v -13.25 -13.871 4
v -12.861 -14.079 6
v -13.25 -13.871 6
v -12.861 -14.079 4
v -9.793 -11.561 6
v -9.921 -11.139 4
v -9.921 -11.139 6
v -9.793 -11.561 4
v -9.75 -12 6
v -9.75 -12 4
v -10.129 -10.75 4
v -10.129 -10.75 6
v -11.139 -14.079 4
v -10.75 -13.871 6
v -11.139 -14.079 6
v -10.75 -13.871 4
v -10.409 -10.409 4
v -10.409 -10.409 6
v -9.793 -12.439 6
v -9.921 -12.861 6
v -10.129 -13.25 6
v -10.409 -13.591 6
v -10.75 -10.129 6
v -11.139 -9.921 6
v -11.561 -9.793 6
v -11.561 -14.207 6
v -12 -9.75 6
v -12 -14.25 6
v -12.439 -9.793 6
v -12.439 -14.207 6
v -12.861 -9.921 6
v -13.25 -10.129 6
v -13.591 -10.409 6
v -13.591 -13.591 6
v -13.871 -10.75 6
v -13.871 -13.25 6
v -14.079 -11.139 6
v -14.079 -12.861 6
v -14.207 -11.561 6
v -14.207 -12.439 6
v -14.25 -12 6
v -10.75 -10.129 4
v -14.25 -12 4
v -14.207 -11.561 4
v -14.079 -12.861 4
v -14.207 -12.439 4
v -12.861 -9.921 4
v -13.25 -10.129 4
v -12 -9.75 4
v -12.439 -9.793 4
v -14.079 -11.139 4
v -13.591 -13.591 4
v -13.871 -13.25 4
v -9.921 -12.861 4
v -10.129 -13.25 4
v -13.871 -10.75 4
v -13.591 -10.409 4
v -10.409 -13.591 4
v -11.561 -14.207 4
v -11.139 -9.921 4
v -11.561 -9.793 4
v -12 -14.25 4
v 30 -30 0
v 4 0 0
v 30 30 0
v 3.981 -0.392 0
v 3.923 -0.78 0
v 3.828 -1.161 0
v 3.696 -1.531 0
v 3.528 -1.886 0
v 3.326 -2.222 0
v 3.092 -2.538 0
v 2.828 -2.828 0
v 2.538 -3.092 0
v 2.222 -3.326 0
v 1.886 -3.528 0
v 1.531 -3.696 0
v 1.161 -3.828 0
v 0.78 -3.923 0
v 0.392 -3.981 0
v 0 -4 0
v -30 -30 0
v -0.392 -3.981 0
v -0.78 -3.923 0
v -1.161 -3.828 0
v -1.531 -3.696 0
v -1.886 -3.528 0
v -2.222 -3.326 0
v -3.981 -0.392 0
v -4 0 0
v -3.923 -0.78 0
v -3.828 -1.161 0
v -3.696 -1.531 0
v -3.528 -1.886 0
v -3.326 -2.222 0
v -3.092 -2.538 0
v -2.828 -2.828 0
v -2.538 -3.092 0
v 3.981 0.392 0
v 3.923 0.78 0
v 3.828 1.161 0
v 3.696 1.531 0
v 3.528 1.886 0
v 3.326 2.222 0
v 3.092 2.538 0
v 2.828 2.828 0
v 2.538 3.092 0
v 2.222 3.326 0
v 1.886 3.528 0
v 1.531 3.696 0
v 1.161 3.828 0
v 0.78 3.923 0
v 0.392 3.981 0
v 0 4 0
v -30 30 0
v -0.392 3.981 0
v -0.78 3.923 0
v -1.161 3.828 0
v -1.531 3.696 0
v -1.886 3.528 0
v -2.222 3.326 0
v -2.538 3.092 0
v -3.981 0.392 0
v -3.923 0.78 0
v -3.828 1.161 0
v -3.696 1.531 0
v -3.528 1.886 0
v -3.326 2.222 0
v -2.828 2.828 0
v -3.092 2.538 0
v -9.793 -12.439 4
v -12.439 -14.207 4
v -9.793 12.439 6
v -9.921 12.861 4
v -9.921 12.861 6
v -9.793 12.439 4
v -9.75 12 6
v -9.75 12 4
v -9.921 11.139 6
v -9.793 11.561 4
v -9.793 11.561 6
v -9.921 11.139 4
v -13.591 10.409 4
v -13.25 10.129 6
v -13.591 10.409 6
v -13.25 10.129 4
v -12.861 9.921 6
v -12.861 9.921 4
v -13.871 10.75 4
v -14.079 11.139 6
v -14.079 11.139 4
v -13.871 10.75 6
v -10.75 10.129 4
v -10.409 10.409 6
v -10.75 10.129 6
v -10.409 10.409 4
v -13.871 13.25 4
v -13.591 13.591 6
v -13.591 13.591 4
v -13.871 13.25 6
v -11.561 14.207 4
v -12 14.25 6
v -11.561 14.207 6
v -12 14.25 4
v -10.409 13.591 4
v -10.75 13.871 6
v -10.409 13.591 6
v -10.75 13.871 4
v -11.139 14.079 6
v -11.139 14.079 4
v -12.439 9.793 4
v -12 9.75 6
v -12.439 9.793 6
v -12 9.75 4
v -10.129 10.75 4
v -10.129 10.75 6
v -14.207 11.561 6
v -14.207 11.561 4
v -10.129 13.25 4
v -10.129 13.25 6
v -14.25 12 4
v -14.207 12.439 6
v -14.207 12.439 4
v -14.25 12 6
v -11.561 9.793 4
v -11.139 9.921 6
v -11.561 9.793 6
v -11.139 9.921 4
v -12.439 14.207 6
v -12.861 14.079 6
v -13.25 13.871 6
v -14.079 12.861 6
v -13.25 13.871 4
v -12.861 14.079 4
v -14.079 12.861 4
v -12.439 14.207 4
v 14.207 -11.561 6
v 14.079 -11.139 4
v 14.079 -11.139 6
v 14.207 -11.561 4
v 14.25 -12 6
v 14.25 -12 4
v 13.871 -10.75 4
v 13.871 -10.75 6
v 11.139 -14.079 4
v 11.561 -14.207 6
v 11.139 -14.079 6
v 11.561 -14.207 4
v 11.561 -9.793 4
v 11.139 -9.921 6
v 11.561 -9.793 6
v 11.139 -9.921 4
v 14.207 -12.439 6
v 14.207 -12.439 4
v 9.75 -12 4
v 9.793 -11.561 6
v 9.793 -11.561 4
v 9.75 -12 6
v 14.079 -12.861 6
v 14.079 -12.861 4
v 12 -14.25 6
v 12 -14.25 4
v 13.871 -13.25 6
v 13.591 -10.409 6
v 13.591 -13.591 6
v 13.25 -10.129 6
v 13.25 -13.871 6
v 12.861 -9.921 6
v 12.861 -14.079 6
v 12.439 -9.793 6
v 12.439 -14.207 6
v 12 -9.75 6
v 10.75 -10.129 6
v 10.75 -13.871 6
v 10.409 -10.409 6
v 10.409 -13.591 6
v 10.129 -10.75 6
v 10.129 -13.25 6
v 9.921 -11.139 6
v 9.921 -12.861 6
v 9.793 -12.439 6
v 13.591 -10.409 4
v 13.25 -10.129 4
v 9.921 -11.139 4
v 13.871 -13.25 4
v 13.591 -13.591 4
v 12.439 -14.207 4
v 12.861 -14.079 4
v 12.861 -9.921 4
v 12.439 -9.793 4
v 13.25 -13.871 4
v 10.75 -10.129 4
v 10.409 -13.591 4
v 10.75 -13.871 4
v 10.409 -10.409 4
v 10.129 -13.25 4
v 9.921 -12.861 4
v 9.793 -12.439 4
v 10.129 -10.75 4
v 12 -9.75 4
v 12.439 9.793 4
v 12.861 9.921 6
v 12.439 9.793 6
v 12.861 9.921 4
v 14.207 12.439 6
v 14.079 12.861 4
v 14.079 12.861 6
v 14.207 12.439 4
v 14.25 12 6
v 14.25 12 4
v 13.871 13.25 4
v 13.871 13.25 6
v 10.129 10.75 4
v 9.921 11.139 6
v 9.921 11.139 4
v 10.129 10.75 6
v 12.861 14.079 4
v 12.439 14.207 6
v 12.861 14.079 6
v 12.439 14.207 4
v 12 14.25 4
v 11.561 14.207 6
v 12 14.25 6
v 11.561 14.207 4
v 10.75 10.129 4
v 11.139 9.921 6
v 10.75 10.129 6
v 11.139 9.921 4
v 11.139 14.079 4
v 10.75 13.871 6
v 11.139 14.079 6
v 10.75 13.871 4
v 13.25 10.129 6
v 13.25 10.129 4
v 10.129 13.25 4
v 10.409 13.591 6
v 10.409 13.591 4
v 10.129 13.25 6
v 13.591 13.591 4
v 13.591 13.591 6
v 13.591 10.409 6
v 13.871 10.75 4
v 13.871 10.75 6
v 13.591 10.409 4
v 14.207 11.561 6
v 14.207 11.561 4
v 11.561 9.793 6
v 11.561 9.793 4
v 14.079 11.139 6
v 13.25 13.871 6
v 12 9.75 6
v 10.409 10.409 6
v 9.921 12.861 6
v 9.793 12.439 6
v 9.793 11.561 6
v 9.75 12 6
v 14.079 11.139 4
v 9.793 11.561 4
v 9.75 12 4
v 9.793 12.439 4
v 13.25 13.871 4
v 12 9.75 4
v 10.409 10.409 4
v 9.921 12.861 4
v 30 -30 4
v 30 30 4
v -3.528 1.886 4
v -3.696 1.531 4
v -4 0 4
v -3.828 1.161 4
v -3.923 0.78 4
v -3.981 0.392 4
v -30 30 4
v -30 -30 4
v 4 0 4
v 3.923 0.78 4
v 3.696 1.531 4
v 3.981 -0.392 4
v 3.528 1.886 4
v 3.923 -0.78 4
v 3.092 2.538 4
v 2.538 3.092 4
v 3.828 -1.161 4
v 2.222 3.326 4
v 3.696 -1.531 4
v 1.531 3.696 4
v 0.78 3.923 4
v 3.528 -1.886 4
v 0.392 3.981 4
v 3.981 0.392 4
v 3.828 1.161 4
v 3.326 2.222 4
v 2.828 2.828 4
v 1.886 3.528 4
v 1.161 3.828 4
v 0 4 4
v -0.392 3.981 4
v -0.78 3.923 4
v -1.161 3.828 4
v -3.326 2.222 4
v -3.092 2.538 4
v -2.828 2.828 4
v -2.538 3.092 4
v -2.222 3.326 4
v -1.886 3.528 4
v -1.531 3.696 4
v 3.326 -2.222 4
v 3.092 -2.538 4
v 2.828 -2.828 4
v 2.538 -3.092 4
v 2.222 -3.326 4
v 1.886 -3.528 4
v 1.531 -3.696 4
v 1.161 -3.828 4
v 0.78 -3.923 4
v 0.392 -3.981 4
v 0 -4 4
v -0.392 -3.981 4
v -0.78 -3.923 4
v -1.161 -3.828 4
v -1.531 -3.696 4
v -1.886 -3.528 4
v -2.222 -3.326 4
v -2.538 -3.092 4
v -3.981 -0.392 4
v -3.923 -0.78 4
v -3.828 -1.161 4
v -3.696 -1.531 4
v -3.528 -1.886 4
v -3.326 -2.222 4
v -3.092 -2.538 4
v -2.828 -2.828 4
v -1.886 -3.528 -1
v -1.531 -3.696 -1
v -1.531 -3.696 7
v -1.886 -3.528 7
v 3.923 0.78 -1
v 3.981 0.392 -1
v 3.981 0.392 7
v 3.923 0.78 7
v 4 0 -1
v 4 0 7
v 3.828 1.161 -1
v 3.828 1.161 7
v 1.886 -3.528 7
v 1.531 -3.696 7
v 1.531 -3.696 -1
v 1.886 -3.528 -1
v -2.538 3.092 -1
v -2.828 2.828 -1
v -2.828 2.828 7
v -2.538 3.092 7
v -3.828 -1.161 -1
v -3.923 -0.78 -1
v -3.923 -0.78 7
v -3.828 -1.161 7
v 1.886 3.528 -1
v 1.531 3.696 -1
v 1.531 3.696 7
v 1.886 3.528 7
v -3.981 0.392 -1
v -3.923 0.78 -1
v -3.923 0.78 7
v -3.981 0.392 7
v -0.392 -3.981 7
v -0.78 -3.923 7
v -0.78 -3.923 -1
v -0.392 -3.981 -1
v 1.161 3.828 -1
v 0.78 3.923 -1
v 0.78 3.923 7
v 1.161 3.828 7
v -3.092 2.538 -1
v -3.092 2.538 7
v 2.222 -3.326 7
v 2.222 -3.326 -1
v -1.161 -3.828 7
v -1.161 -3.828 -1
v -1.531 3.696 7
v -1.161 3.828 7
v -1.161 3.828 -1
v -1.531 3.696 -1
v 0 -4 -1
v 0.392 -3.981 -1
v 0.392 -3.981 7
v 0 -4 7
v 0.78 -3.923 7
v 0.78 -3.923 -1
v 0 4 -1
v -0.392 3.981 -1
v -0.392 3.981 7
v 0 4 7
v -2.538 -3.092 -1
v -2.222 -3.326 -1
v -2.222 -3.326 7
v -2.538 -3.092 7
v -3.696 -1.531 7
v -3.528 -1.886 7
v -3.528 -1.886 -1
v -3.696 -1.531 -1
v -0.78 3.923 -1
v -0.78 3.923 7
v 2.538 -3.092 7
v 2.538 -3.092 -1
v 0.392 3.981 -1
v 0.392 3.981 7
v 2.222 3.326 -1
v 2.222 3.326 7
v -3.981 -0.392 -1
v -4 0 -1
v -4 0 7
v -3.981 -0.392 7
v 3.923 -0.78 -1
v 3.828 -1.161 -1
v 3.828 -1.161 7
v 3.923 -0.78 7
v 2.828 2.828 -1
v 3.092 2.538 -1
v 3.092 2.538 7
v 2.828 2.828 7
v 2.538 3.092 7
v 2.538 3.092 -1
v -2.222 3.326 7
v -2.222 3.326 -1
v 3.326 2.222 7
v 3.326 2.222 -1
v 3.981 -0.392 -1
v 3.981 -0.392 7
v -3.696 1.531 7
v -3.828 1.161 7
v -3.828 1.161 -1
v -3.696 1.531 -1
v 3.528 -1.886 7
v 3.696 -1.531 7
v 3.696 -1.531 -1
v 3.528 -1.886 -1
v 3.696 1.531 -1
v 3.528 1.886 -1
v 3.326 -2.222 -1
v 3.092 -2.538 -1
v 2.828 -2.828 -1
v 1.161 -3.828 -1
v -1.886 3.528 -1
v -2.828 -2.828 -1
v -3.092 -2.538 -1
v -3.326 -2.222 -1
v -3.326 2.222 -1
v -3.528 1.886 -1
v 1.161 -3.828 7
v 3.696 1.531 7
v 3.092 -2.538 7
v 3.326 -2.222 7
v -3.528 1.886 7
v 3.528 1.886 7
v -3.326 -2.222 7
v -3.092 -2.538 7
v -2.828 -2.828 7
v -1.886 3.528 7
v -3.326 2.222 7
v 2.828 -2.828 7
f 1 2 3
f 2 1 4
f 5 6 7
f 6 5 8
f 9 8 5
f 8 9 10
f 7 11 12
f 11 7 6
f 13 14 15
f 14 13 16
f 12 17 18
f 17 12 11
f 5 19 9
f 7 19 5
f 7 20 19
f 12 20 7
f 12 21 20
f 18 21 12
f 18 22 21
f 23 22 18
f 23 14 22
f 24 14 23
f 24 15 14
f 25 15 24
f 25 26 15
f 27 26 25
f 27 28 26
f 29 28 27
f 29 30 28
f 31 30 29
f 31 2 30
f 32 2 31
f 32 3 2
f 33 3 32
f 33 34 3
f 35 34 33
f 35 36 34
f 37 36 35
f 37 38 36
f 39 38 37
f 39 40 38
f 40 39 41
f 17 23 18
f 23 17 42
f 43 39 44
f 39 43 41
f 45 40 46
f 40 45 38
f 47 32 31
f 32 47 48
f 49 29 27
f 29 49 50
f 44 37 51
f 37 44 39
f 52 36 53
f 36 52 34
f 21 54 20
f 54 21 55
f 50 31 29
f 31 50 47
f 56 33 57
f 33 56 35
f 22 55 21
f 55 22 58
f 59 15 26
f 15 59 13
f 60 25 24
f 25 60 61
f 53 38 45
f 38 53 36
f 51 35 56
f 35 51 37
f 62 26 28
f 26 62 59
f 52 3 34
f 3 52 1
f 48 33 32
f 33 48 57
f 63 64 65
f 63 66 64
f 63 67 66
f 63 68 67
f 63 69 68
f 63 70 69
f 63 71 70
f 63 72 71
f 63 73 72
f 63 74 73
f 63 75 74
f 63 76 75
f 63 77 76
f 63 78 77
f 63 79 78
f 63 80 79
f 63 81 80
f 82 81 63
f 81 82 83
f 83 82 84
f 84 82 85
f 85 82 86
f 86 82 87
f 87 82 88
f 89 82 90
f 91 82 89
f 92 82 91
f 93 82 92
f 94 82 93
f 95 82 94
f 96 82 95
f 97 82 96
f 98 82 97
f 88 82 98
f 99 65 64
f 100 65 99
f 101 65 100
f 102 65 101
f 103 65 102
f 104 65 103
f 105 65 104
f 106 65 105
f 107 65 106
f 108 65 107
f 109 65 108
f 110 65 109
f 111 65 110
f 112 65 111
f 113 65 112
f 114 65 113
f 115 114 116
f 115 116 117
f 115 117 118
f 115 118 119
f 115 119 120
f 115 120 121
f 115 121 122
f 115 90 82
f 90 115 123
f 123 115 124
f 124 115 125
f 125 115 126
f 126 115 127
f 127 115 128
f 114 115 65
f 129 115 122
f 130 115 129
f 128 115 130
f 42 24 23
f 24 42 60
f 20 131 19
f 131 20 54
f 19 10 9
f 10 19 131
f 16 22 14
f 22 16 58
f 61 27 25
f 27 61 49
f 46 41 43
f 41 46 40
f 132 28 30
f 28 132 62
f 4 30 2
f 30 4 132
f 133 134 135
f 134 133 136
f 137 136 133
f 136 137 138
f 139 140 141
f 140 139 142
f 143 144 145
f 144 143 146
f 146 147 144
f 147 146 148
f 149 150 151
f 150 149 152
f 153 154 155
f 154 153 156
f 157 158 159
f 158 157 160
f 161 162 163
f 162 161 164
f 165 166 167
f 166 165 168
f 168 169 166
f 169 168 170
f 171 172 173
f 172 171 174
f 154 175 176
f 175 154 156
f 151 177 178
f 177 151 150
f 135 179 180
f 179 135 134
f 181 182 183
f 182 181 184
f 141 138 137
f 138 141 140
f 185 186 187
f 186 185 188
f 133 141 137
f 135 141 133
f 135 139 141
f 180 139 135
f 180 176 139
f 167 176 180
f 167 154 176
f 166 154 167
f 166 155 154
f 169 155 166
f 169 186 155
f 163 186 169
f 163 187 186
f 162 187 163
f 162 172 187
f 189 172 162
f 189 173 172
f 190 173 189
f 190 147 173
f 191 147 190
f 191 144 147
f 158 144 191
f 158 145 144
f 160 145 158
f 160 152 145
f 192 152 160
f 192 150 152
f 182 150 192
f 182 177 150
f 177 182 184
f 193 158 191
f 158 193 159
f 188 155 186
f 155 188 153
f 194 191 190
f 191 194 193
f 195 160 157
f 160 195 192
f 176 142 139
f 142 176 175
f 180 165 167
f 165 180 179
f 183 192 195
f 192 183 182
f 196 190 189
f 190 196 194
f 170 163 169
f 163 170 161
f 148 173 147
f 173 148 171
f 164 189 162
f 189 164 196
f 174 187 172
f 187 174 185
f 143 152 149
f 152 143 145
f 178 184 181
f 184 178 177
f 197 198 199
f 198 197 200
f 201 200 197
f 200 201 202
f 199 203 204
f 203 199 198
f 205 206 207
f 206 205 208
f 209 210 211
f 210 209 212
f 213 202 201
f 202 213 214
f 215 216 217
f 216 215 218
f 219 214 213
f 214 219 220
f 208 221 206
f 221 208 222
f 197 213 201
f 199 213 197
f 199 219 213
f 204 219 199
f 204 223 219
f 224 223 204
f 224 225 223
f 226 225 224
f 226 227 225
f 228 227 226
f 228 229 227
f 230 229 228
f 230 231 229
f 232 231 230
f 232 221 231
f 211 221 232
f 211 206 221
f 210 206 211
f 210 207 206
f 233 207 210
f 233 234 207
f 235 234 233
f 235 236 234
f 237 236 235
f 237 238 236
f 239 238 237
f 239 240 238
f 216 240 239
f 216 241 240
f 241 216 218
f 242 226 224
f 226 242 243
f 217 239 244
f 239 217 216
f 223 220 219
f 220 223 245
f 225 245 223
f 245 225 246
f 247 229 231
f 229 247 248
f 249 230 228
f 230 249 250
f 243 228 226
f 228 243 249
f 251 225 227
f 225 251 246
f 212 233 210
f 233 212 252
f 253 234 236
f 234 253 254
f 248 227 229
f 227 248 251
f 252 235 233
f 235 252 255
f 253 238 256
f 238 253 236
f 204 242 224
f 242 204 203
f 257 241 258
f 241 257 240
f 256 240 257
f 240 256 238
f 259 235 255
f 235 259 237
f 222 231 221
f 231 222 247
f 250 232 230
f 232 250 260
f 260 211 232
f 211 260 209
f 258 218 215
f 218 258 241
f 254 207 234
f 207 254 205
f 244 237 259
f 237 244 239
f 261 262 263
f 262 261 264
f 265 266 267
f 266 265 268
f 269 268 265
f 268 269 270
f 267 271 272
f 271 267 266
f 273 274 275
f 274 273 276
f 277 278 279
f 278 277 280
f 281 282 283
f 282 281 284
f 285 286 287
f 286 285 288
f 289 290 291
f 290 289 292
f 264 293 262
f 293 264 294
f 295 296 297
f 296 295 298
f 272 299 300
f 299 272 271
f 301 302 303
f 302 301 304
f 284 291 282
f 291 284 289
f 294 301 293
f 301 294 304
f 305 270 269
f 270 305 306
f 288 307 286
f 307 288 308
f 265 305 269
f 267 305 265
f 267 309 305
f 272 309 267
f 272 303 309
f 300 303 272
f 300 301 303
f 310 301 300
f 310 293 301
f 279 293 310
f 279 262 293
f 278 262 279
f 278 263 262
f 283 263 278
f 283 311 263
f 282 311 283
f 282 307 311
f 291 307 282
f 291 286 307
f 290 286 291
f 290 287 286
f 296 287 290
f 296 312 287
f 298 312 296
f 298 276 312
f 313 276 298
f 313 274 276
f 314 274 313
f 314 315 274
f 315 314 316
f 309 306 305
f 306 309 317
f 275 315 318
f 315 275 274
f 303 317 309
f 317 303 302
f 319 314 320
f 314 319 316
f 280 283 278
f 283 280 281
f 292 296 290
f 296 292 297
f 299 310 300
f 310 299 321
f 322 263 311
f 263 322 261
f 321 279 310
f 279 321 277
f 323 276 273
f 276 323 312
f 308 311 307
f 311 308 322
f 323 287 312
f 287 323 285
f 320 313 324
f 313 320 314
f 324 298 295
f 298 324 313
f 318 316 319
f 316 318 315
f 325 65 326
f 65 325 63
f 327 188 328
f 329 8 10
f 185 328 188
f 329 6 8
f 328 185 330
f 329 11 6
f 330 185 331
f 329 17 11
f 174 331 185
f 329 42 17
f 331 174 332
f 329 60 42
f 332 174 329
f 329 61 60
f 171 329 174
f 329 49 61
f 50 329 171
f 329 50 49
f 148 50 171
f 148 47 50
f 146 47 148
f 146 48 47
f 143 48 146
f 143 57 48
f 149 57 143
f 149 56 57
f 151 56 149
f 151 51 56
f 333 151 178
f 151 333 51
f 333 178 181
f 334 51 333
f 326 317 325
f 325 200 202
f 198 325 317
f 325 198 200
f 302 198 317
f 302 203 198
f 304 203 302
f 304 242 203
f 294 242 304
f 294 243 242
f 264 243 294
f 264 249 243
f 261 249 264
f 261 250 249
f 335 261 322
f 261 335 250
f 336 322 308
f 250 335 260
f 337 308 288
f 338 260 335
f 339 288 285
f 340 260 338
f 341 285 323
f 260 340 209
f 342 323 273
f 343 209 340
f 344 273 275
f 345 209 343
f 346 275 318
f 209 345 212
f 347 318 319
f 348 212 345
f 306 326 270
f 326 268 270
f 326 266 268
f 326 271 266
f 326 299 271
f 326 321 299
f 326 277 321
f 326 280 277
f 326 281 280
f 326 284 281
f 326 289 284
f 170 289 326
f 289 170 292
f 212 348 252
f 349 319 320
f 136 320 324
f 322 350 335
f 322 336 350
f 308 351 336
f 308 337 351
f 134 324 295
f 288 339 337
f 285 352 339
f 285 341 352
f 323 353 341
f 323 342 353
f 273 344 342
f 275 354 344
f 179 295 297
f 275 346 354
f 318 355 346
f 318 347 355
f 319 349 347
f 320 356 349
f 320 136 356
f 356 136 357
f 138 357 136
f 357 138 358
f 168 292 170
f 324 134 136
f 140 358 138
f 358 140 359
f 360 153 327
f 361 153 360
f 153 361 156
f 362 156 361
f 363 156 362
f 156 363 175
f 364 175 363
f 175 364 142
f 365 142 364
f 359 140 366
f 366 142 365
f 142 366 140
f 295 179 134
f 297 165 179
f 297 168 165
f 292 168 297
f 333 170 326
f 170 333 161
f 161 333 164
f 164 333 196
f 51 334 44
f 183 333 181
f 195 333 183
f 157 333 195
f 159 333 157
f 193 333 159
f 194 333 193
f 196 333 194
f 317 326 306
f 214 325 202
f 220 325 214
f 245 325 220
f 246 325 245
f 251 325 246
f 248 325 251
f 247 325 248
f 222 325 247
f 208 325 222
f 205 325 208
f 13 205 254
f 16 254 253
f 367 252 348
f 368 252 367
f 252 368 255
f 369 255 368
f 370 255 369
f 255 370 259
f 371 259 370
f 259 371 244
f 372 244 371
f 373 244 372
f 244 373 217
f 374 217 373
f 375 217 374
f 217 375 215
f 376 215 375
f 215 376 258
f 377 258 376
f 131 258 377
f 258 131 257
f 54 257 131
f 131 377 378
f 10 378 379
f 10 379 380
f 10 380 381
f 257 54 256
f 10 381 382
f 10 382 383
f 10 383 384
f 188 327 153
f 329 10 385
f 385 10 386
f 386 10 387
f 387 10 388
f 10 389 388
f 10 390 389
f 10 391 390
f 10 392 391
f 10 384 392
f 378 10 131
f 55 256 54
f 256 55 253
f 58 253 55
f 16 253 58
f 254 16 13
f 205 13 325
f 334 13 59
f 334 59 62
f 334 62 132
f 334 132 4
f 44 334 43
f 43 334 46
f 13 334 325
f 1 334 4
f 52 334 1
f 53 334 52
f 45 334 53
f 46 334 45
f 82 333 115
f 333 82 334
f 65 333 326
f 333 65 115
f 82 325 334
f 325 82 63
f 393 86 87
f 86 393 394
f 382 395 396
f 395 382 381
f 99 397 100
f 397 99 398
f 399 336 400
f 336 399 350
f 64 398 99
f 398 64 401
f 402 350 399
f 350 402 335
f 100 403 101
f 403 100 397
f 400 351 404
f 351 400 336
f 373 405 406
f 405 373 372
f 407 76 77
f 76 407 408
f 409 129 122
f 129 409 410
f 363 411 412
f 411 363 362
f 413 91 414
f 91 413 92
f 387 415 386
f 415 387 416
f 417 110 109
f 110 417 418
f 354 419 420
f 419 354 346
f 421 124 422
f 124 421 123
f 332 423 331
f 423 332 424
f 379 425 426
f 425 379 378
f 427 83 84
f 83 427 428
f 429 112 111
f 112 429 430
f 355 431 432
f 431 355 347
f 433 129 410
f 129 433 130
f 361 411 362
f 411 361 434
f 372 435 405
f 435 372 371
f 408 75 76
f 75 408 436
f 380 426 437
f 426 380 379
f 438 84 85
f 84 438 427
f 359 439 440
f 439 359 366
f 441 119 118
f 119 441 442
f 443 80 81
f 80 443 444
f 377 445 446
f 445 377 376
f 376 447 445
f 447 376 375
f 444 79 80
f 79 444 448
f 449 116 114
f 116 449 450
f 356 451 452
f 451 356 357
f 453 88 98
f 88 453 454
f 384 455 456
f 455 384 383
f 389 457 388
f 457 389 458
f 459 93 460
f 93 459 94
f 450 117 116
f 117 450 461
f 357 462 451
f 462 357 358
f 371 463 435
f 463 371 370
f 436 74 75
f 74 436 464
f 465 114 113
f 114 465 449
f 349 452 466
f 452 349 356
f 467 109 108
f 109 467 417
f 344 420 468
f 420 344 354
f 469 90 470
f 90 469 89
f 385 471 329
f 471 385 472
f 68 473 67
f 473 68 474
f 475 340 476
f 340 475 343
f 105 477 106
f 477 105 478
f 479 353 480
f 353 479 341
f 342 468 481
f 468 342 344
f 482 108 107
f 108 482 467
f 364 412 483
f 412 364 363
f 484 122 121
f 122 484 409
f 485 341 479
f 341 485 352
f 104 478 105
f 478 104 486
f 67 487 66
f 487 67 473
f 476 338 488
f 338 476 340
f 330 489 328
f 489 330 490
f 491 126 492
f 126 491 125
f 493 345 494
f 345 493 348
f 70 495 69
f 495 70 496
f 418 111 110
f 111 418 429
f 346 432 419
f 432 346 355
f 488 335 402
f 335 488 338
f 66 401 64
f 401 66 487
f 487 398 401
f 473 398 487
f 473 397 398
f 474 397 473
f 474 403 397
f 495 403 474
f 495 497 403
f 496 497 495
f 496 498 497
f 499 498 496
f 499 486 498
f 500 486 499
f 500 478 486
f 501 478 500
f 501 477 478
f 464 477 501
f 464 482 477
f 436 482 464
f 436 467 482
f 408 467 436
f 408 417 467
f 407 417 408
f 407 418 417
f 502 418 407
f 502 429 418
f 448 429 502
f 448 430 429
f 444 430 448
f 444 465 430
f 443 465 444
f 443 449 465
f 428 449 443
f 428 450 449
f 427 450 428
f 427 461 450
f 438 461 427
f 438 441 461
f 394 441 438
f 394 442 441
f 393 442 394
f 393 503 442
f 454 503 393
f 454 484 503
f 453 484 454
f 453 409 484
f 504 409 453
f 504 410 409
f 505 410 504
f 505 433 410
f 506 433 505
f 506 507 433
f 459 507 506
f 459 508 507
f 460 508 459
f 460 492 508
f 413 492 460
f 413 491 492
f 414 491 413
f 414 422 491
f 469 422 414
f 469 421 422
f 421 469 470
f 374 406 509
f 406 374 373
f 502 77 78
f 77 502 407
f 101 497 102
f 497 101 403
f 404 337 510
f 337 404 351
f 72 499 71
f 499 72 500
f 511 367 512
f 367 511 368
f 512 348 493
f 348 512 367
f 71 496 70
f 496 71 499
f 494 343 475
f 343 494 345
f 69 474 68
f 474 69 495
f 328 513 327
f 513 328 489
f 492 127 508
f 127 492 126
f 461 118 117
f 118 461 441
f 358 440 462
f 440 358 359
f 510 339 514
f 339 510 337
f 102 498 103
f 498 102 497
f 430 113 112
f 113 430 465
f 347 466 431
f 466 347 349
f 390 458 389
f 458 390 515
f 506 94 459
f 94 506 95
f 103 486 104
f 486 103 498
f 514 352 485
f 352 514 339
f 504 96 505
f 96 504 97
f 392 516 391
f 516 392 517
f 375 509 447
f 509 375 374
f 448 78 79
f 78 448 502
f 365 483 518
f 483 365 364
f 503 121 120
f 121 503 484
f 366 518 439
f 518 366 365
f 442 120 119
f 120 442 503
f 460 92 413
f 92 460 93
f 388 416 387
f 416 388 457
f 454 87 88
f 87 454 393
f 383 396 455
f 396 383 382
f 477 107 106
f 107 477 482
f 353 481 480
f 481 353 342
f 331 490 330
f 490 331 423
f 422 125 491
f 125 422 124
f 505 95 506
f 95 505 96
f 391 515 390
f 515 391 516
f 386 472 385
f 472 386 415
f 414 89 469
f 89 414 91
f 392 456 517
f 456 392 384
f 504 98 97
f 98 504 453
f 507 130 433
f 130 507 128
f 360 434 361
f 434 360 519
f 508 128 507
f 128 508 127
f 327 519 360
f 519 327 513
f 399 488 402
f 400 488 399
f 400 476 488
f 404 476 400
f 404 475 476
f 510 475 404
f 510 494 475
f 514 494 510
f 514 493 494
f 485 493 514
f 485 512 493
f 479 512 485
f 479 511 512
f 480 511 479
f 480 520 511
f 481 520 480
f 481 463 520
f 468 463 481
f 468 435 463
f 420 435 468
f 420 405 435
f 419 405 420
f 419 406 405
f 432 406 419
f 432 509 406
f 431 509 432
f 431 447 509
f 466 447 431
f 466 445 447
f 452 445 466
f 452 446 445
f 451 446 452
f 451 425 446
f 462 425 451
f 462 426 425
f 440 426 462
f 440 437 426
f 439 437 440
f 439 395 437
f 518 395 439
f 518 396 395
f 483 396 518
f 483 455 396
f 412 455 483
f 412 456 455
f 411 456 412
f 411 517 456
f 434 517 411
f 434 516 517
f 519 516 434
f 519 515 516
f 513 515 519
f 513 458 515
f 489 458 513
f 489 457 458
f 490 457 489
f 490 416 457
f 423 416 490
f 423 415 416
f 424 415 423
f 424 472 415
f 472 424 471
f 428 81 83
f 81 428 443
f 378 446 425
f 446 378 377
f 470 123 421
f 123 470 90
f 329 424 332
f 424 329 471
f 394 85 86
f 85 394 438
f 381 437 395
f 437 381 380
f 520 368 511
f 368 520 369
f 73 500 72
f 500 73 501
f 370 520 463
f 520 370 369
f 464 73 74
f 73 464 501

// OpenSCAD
plate_x=60; plate_y=60; plate_t=4; bolt_r=2.25; shaft_r=4;
module plate(){ translate([-plate_x/2,-plate_y/2,0]) cube([plate_x,plate_y,plate_t]); translate([0,0,0]) for(i=[-1,1]) for(j=[-1,1]) translate([i*12,j*12,0]) cylinder(h=plate_t+2,r=bolt_r,$fn=32); translate([0,0,-1]) cylinder(h=plate_t+4,r=shaft_r,$fn=64); }
plate();
